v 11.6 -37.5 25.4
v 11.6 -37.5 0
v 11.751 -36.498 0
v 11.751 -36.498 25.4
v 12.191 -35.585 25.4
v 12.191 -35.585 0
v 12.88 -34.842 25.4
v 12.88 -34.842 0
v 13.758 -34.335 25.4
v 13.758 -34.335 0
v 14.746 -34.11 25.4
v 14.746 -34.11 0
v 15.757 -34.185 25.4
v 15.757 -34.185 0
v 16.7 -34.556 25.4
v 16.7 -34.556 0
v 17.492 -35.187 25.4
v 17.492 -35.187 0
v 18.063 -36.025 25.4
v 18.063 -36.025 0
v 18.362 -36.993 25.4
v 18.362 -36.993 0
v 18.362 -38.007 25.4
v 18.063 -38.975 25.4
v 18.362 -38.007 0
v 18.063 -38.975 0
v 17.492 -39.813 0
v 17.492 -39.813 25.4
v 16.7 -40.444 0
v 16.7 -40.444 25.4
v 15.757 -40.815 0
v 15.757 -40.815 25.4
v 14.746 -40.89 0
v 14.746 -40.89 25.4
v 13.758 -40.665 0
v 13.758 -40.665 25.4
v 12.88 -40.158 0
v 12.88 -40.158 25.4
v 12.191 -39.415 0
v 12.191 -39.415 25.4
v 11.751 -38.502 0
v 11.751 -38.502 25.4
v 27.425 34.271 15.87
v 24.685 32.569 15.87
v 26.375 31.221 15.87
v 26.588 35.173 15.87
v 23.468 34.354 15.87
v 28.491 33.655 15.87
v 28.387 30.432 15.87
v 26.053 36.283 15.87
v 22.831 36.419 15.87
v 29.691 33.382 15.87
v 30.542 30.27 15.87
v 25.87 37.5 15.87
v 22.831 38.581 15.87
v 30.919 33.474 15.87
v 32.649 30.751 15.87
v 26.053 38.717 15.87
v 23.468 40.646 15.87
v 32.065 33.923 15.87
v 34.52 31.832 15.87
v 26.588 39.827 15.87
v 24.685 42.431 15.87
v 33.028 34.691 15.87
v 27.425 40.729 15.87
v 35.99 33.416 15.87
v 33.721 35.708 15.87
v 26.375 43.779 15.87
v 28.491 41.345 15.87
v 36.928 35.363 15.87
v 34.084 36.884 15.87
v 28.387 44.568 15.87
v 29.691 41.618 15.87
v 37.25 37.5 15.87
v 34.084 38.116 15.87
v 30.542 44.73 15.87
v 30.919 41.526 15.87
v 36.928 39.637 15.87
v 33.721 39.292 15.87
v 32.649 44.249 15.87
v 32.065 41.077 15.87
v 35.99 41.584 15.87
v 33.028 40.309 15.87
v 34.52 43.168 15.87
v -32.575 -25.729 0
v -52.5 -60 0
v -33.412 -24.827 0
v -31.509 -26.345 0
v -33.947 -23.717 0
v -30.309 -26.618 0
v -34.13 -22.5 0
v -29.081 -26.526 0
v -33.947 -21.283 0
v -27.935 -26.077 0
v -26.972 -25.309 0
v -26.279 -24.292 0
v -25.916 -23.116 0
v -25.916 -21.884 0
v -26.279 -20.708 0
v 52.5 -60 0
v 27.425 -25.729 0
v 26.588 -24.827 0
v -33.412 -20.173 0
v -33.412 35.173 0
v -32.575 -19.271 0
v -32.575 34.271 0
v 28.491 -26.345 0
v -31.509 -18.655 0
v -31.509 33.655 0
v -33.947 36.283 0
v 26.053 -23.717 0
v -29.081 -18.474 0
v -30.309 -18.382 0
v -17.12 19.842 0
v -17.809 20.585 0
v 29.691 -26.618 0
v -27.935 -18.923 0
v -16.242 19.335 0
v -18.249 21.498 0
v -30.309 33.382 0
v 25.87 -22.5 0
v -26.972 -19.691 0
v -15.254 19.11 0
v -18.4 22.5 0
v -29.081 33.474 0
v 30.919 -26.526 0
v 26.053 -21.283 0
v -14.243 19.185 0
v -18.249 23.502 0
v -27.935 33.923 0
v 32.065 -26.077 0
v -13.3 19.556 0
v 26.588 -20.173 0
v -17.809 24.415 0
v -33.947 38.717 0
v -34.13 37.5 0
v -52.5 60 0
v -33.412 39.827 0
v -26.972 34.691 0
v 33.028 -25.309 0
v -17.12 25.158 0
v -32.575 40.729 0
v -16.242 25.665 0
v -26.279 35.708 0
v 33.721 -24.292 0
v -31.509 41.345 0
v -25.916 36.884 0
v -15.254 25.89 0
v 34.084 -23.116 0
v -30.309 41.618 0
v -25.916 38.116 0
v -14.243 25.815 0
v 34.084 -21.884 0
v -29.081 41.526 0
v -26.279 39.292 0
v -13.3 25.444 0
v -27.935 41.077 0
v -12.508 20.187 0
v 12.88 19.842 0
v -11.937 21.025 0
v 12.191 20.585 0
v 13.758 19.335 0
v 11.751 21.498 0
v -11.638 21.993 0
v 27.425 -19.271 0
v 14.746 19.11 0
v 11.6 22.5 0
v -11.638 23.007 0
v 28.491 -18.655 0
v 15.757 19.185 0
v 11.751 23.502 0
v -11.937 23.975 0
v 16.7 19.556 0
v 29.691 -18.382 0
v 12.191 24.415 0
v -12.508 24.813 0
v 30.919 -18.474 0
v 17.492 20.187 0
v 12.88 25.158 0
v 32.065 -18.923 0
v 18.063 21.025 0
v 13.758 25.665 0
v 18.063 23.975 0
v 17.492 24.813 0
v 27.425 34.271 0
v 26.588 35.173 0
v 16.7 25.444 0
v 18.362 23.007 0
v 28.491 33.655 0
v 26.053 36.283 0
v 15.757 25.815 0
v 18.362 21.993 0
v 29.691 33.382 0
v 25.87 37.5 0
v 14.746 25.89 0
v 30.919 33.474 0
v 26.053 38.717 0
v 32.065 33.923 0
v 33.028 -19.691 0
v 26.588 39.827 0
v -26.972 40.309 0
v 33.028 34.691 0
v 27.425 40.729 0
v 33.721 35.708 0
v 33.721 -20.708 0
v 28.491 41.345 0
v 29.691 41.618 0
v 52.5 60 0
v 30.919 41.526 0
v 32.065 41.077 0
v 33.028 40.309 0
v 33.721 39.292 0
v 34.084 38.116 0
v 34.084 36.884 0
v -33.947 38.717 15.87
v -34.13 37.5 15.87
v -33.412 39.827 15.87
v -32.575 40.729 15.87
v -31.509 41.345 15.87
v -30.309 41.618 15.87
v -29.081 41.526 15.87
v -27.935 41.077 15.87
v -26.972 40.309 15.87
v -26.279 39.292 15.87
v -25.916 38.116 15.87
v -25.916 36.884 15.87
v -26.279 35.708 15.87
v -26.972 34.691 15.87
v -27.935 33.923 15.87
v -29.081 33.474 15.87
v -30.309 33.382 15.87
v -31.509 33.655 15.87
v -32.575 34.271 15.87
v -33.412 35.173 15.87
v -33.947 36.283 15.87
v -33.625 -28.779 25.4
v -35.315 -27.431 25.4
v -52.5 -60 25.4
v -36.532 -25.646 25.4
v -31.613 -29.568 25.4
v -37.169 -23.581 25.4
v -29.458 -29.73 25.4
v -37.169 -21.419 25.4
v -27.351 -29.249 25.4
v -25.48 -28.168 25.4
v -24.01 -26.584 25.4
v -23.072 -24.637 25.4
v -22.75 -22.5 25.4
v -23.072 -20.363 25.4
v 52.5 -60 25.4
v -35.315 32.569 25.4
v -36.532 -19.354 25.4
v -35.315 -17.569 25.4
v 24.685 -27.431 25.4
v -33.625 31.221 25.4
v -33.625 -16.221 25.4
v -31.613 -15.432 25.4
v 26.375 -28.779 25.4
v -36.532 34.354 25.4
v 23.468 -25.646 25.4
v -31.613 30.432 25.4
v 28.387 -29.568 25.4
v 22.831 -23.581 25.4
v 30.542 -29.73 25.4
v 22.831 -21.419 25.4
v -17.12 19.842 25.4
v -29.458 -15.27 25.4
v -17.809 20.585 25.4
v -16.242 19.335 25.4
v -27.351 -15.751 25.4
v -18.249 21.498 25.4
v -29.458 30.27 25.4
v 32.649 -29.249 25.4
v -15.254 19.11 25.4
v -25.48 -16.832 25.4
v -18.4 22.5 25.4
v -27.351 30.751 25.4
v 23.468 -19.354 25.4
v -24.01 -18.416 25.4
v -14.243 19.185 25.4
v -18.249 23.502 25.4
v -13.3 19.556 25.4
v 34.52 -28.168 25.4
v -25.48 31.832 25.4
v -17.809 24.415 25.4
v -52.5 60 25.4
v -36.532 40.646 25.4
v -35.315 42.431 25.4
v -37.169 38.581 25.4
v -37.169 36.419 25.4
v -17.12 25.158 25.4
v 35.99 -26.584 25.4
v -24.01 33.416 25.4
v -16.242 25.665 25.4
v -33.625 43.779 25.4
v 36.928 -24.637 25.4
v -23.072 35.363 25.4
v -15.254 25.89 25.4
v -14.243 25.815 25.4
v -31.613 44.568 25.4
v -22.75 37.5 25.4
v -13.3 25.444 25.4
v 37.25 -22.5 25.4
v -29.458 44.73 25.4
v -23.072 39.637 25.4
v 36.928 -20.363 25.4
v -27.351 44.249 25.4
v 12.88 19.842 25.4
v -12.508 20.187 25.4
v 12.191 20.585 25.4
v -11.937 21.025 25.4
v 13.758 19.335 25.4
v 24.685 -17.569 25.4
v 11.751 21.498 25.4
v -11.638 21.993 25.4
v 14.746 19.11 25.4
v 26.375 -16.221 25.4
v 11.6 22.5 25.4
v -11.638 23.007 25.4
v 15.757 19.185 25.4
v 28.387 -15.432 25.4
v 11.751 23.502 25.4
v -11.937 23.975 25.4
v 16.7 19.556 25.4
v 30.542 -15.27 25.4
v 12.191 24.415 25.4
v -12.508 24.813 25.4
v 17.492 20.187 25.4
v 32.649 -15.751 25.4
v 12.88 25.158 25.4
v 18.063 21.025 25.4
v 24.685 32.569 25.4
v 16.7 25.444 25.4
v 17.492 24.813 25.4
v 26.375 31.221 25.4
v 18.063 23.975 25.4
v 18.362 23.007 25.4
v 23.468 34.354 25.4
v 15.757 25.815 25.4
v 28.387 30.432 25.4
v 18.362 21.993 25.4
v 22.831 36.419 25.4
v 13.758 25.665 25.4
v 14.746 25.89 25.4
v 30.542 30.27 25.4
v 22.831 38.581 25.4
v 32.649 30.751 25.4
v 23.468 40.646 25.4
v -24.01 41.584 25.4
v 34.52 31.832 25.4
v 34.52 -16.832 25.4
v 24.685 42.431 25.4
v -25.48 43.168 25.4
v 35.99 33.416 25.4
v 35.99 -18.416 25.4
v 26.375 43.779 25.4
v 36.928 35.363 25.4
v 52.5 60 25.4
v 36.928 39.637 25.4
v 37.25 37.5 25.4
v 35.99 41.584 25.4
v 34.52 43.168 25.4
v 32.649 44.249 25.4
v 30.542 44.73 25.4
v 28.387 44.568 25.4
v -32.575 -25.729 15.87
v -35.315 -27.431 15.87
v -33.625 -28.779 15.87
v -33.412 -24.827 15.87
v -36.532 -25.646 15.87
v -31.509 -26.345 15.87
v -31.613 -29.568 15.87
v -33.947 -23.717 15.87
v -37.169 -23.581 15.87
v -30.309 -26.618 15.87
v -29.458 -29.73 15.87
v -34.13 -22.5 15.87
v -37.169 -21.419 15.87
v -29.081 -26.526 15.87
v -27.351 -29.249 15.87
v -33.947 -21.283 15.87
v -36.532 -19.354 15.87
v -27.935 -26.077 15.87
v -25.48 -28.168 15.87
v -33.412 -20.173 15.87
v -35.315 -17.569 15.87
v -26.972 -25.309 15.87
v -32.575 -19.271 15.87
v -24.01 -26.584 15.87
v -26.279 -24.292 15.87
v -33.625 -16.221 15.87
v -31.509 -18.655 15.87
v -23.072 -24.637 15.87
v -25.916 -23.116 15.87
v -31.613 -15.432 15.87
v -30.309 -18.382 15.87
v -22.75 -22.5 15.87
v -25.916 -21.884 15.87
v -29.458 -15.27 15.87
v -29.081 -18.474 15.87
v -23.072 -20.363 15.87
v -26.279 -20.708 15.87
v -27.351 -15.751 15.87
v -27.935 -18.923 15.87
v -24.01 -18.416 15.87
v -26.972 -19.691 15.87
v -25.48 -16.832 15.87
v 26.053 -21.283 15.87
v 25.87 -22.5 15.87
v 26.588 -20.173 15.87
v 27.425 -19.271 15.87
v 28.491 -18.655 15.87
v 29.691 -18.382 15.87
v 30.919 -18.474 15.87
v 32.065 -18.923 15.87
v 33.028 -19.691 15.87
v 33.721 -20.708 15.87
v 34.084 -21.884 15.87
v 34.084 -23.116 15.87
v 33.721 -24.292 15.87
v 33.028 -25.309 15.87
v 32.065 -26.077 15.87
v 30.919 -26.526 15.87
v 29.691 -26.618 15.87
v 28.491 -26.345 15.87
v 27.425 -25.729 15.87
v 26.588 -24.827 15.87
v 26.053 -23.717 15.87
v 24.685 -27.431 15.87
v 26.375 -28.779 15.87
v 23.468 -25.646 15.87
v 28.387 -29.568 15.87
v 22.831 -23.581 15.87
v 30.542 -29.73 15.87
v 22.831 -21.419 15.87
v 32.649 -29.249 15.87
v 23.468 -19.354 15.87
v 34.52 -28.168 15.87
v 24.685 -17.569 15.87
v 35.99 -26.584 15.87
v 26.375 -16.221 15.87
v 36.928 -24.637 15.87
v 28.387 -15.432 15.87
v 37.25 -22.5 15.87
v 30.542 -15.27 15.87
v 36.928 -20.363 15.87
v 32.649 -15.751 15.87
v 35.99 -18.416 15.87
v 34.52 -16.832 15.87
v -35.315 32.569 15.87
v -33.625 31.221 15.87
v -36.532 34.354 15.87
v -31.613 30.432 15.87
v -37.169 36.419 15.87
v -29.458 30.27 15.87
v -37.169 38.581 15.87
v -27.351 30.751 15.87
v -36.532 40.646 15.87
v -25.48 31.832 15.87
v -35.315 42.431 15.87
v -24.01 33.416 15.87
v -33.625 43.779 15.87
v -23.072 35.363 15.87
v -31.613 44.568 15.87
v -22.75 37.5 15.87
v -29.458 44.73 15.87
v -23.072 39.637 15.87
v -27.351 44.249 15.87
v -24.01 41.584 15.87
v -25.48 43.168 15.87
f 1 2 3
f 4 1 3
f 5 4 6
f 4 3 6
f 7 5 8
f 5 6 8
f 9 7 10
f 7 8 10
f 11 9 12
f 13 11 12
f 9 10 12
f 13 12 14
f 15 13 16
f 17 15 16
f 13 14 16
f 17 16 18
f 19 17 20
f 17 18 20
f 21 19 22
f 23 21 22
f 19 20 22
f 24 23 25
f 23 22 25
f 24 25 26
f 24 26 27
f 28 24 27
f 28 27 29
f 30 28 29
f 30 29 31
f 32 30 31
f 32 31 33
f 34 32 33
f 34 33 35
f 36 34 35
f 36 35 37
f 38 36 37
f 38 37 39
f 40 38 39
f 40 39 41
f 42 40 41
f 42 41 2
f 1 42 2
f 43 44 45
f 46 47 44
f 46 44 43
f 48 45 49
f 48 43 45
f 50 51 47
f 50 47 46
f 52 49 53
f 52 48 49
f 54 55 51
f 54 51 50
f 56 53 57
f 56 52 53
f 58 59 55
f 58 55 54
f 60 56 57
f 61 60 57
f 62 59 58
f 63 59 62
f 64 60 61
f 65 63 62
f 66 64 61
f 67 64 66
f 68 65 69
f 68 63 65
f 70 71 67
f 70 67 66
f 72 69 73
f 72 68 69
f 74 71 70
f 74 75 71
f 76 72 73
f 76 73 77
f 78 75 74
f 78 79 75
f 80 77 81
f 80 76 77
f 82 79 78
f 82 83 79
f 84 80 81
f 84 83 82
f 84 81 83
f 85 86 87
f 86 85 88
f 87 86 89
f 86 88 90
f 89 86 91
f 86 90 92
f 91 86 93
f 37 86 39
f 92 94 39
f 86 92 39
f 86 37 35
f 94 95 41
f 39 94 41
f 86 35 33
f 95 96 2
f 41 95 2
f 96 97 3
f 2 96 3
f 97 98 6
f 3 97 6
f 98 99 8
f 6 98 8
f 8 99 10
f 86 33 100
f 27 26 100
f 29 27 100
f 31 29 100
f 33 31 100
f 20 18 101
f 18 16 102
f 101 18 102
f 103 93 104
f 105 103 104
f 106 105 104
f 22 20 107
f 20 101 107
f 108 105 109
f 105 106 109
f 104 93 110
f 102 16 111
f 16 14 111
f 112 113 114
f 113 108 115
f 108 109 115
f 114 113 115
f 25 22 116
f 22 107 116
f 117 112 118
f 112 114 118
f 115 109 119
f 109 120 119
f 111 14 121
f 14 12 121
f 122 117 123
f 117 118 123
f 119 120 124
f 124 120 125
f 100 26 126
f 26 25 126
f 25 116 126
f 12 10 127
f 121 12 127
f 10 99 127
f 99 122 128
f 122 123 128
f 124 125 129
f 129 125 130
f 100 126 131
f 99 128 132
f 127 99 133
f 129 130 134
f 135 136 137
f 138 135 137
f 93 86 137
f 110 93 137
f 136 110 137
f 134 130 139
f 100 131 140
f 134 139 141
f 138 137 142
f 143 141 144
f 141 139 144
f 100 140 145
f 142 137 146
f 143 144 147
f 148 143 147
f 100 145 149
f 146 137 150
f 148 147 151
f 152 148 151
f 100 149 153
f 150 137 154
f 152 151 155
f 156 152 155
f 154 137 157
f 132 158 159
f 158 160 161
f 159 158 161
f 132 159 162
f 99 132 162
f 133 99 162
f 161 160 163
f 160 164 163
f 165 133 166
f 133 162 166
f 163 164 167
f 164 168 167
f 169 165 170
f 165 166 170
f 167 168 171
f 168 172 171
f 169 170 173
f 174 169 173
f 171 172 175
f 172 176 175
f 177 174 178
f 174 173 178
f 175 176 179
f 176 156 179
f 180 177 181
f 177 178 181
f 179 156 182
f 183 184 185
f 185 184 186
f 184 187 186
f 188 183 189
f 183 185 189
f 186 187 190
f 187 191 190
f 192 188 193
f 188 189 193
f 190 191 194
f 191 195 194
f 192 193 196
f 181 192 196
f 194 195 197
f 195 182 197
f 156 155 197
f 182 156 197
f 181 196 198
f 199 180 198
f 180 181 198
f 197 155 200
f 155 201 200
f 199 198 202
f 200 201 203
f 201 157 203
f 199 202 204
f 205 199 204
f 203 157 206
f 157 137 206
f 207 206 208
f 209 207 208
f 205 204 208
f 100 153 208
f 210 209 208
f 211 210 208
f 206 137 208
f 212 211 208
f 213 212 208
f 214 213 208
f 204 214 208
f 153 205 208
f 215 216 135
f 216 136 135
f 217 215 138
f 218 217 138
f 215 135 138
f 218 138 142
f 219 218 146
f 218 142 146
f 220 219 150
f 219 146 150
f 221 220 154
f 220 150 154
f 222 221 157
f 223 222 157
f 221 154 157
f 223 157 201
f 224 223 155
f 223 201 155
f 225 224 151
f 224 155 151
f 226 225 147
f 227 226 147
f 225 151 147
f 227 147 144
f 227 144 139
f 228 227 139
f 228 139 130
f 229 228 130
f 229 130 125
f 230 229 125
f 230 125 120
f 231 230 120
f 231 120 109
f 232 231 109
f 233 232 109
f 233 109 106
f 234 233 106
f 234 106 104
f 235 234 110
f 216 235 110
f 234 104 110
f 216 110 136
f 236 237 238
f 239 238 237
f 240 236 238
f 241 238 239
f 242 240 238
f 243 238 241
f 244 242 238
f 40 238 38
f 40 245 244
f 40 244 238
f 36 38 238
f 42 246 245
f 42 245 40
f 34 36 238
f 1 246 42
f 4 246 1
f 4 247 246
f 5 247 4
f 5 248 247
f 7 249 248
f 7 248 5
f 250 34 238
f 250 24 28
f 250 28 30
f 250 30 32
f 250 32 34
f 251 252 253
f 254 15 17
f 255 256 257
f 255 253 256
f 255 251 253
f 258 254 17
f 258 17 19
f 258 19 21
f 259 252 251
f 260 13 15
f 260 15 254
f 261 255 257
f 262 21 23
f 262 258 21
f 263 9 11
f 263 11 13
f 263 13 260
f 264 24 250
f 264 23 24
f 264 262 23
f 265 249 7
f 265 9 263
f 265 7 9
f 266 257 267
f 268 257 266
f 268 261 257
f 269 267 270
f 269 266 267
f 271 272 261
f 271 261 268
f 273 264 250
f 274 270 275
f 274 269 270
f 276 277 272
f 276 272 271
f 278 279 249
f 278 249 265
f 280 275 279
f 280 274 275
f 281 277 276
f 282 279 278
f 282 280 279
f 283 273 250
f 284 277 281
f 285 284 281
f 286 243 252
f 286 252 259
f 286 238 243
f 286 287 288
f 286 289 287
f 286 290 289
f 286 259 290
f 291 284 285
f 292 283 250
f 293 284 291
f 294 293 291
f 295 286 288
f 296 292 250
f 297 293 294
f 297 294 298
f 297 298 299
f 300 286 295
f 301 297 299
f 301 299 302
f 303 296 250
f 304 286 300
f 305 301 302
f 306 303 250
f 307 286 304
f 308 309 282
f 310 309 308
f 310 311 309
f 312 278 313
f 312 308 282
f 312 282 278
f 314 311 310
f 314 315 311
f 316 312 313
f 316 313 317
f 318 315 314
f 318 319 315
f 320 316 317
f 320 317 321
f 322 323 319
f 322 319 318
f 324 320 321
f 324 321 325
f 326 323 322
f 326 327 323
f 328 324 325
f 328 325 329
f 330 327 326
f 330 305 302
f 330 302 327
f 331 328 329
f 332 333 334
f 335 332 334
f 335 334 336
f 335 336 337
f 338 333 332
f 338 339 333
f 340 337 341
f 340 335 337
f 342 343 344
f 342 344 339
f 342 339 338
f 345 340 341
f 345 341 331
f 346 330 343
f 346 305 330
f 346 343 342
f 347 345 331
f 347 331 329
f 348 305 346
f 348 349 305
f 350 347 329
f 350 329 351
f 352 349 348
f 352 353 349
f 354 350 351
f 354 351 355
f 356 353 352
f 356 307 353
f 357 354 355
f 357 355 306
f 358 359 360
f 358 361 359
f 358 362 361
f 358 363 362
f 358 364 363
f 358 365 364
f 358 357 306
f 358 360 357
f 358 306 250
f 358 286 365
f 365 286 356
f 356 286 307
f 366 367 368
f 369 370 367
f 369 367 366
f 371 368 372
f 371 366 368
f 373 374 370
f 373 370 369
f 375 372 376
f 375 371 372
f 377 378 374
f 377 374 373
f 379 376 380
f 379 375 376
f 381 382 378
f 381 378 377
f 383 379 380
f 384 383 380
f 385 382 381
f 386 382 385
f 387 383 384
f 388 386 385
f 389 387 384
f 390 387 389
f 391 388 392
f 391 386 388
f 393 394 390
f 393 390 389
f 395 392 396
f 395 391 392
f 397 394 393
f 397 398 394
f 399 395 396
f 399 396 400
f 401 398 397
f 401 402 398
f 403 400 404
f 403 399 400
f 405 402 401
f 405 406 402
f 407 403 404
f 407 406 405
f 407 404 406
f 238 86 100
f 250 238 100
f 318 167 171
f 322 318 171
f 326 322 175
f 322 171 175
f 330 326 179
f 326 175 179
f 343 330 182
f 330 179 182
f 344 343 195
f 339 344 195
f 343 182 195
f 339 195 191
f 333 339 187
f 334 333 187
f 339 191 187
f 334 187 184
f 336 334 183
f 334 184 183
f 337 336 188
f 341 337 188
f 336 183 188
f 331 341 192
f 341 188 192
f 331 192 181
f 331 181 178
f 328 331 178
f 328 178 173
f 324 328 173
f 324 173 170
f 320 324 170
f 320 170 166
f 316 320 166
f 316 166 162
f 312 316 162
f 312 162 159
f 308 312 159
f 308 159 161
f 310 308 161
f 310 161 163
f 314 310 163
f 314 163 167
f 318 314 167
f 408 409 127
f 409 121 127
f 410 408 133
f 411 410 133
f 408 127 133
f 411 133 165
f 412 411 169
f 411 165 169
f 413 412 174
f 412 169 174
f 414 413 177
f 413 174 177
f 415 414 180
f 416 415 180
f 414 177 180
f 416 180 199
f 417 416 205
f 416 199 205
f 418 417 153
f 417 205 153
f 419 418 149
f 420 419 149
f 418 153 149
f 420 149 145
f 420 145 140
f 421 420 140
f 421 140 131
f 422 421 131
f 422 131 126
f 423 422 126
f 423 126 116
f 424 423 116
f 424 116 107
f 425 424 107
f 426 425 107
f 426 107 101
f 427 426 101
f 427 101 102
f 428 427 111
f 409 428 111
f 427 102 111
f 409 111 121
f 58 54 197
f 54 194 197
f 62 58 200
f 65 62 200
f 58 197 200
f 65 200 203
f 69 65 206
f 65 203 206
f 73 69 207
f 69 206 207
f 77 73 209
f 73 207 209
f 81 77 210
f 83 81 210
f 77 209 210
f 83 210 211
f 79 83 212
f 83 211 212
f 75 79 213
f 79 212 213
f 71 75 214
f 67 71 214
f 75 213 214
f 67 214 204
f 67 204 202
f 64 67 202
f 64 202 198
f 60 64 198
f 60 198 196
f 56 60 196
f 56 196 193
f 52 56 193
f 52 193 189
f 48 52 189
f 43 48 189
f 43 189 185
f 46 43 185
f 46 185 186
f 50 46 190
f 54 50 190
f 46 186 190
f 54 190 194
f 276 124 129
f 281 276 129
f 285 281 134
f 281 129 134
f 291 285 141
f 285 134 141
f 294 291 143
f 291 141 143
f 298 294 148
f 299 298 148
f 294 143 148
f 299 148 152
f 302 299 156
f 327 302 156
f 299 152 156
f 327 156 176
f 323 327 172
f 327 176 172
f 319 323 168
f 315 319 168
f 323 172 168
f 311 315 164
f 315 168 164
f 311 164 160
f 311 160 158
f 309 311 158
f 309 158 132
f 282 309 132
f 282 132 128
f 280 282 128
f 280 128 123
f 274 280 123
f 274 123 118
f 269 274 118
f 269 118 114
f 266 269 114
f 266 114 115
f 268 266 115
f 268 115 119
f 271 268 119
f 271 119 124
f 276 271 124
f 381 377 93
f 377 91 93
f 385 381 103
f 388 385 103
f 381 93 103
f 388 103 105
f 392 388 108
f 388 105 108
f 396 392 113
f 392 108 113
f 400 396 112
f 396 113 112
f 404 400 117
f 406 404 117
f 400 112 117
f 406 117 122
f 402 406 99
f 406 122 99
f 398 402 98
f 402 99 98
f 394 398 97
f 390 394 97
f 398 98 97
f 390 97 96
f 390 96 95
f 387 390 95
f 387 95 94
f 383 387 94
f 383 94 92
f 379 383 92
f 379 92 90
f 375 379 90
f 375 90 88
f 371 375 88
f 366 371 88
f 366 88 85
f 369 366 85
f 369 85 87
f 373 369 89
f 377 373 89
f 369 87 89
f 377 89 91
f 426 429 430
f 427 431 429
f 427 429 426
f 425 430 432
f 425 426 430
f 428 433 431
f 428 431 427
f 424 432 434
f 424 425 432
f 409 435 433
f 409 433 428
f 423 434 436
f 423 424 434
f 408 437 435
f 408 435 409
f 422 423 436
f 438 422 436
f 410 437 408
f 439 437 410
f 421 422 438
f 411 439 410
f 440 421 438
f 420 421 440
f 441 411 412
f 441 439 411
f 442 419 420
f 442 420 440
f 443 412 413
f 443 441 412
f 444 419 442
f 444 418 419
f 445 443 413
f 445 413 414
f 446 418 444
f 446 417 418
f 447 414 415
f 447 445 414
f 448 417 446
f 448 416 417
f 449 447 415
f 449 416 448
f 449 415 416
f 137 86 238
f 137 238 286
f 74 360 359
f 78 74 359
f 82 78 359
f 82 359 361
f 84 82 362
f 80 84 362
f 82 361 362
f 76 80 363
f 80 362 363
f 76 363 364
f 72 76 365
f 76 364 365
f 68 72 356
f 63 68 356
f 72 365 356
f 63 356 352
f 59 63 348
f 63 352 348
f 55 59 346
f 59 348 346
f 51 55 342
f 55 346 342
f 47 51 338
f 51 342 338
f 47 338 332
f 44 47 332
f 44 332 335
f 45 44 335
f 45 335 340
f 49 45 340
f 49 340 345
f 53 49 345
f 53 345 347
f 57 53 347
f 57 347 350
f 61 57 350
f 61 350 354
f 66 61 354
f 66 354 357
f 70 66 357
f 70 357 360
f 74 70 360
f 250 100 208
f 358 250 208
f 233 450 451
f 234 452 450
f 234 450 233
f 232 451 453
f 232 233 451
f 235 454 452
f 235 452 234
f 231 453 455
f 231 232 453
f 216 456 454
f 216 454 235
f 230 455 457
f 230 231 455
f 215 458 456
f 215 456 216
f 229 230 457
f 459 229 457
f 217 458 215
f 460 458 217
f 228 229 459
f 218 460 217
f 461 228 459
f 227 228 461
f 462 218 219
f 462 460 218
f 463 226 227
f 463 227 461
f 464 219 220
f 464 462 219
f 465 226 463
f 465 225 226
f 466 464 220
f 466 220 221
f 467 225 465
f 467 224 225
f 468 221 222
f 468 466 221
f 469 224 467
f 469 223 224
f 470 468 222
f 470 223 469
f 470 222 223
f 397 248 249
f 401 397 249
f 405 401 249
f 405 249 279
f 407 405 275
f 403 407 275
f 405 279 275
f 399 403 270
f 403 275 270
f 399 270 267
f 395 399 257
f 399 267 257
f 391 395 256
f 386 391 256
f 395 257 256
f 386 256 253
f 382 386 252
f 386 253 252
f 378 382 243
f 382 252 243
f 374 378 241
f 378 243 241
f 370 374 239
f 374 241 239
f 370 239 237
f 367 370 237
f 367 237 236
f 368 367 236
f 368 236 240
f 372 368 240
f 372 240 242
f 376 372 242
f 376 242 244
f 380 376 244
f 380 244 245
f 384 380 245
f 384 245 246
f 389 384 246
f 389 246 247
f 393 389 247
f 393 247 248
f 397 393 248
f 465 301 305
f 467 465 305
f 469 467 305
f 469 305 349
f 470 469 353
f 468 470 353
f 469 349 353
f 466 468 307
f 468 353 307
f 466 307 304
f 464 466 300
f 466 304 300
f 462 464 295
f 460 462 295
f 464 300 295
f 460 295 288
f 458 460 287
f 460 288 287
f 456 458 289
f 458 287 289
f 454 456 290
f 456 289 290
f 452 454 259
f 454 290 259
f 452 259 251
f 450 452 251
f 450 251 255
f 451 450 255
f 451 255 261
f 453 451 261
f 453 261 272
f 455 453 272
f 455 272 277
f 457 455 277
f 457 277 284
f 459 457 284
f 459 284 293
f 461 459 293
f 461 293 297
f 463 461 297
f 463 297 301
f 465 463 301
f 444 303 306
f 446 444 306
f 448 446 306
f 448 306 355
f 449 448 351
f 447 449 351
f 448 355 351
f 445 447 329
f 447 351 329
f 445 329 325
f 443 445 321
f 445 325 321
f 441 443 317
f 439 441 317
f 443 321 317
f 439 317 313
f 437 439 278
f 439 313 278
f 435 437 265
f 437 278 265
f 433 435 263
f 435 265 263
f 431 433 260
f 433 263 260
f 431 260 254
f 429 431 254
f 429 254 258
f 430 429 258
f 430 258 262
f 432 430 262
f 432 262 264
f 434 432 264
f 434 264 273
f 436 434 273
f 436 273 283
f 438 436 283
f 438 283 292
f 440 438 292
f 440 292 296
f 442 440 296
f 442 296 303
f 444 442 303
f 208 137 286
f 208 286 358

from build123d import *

# Parameters (mm, degrees)
F0_W           = 105
F0_H           = 120
F1_DEPTH       = 25.4
F3_D           = 8.26
F3_CBORE_D     = 14.5
F3_CBORE_DEPTH = 9.53
F5_D           = 6.8


with BuildPart() as f1:
    # F0 (on Top) → F1 (new body)
    with BuildSketch(Plane.XY):
        Rectangle(F0_W, F0_H)
    extrude(amount=F1_DEPTH)

    # F3 (through all)
    with Locations(Plane.XY.offset(25.4)):
        with Locations((-30, 37.5), (30, 37.5), (30, -22.5), (-30, -22.5)):
            CounterBoreHole(F3_D / 2, F3_CBORE_D / 2, F3_CBORE_DEPTH)

    # F5 (through all)
    with Locations(Plane.XY.offset(25.4)):
        with Locations((15, -37.5), (15, 22.5), (-15, 22.5)):
            Hole(F5_D / 2)


solid = f1.part
